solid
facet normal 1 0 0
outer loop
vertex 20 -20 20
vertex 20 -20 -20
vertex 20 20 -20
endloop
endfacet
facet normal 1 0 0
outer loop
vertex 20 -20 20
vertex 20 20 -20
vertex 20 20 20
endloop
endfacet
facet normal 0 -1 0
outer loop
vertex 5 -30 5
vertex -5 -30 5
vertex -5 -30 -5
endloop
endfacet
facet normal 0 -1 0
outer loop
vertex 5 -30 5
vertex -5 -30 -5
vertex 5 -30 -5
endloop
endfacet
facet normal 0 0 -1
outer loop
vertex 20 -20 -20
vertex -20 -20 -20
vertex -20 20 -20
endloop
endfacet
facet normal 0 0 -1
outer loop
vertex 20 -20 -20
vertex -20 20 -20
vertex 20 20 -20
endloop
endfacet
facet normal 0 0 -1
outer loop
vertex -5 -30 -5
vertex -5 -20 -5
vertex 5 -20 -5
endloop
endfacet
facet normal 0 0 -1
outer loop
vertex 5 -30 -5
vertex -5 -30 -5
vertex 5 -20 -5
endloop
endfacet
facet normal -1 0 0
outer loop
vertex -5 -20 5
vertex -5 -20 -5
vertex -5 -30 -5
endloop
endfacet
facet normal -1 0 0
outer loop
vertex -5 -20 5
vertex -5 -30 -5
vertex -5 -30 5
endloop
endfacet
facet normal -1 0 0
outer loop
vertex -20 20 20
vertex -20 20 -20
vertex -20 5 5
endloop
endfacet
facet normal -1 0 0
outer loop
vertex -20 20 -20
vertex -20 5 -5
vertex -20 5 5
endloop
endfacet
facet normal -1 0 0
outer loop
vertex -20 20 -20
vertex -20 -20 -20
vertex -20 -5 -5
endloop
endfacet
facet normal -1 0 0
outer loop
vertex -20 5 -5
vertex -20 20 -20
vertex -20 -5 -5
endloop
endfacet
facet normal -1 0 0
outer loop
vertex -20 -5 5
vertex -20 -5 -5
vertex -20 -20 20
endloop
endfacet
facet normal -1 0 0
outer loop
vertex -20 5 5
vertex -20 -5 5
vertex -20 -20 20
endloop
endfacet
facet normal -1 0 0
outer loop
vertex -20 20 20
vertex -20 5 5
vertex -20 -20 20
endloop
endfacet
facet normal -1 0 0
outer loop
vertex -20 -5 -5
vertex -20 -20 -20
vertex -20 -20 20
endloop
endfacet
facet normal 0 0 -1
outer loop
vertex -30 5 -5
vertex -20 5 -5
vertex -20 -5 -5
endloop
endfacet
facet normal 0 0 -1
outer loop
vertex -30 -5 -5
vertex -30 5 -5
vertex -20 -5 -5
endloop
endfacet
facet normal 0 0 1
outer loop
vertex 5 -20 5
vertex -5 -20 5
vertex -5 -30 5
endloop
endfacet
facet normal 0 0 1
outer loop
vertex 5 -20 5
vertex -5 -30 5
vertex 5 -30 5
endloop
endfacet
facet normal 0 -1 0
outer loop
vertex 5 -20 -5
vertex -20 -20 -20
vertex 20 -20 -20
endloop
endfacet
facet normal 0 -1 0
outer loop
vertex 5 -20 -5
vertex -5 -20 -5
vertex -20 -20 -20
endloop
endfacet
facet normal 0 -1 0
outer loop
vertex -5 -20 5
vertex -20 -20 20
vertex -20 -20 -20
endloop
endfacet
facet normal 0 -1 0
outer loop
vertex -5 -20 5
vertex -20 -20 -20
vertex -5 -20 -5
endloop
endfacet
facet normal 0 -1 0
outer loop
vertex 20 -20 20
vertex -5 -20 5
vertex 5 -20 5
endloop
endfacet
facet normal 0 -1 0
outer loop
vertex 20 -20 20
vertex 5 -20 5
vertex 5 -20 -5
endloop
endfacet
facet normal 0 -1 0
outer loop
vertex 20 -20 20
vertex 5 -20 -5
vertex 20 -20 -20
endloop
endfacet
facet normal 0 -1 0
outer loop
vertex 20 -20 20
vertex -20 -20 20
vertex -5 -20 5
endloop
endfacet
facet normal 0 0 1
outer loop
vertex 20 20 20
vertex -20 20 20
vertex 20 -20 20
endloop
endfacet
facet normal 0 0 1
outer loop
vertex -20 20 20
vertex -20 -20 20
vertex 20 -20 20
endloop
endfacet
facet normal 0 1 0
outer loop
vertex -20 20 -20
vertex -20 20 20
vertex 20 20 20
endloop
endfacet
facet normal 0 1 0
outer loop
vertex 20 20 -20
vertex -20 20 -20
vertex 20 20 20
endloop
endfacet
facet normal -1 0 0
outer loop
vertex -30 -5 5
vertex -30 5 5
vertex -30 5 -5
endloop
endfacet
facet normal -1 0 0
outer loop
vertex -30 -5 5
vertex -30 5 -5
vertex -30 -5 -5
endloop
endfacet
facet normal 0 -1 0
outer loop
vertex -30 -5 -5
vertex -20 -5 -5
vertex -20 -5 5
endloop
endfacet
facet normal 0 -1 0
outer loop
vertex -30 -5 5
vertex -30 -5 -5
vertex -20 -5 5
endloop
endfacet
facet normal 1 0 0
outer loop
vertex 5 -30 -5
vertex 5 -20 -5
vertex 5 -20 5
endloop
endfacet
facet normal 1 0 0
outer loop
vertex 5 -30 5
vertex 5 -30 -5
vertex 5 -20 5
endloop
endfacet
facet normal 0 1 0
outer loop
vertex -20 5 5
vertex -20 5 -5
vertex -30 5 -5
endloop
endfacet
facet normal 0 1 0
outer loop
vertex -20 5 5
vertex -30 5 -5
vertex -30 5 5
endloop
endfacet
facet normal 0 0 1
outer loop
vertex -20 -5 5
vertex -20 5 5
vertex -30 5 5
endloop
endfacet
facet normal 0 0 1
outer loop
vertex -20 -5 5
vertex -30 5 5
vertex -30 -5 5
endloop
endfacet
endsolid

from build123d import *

# Parameters (mm, degrees)
F0_W     = 40
F0_H     = 40
F1_DEPTH = 20
F2_W     = 10
F2_H     = 10
F3_DEPTH = 10
F4_W     = 10
F4_H     = 10
F5_DEPTH = 10


with BuildPart() as f1:
    # F0 (on Front) → F1 (new body, symmetric)
    with BuildSketch(Plane.XZ):
        Rectangle(F0_W, F0_H)
    extrude(amount=F1_DEPTH, both=True)

    # F2 (on face) → F3 (join)
    with BuildSketch(Plane.XZ.offset(20)):
        Rectangle(F2_W, F2_H)
    extrude(amount=F3_DEPTH)

    # F4 (on face) → F5 (join)
    with BuildSketch(Plane(origin=(-20, 0, 0), x_dir=(0, -1, 0), z_dir=(-1, 0, 0))):
        Rectangle(F4_W, F4_H)
    extrude(amount=F5_DEPTH)


solid = f1.part
